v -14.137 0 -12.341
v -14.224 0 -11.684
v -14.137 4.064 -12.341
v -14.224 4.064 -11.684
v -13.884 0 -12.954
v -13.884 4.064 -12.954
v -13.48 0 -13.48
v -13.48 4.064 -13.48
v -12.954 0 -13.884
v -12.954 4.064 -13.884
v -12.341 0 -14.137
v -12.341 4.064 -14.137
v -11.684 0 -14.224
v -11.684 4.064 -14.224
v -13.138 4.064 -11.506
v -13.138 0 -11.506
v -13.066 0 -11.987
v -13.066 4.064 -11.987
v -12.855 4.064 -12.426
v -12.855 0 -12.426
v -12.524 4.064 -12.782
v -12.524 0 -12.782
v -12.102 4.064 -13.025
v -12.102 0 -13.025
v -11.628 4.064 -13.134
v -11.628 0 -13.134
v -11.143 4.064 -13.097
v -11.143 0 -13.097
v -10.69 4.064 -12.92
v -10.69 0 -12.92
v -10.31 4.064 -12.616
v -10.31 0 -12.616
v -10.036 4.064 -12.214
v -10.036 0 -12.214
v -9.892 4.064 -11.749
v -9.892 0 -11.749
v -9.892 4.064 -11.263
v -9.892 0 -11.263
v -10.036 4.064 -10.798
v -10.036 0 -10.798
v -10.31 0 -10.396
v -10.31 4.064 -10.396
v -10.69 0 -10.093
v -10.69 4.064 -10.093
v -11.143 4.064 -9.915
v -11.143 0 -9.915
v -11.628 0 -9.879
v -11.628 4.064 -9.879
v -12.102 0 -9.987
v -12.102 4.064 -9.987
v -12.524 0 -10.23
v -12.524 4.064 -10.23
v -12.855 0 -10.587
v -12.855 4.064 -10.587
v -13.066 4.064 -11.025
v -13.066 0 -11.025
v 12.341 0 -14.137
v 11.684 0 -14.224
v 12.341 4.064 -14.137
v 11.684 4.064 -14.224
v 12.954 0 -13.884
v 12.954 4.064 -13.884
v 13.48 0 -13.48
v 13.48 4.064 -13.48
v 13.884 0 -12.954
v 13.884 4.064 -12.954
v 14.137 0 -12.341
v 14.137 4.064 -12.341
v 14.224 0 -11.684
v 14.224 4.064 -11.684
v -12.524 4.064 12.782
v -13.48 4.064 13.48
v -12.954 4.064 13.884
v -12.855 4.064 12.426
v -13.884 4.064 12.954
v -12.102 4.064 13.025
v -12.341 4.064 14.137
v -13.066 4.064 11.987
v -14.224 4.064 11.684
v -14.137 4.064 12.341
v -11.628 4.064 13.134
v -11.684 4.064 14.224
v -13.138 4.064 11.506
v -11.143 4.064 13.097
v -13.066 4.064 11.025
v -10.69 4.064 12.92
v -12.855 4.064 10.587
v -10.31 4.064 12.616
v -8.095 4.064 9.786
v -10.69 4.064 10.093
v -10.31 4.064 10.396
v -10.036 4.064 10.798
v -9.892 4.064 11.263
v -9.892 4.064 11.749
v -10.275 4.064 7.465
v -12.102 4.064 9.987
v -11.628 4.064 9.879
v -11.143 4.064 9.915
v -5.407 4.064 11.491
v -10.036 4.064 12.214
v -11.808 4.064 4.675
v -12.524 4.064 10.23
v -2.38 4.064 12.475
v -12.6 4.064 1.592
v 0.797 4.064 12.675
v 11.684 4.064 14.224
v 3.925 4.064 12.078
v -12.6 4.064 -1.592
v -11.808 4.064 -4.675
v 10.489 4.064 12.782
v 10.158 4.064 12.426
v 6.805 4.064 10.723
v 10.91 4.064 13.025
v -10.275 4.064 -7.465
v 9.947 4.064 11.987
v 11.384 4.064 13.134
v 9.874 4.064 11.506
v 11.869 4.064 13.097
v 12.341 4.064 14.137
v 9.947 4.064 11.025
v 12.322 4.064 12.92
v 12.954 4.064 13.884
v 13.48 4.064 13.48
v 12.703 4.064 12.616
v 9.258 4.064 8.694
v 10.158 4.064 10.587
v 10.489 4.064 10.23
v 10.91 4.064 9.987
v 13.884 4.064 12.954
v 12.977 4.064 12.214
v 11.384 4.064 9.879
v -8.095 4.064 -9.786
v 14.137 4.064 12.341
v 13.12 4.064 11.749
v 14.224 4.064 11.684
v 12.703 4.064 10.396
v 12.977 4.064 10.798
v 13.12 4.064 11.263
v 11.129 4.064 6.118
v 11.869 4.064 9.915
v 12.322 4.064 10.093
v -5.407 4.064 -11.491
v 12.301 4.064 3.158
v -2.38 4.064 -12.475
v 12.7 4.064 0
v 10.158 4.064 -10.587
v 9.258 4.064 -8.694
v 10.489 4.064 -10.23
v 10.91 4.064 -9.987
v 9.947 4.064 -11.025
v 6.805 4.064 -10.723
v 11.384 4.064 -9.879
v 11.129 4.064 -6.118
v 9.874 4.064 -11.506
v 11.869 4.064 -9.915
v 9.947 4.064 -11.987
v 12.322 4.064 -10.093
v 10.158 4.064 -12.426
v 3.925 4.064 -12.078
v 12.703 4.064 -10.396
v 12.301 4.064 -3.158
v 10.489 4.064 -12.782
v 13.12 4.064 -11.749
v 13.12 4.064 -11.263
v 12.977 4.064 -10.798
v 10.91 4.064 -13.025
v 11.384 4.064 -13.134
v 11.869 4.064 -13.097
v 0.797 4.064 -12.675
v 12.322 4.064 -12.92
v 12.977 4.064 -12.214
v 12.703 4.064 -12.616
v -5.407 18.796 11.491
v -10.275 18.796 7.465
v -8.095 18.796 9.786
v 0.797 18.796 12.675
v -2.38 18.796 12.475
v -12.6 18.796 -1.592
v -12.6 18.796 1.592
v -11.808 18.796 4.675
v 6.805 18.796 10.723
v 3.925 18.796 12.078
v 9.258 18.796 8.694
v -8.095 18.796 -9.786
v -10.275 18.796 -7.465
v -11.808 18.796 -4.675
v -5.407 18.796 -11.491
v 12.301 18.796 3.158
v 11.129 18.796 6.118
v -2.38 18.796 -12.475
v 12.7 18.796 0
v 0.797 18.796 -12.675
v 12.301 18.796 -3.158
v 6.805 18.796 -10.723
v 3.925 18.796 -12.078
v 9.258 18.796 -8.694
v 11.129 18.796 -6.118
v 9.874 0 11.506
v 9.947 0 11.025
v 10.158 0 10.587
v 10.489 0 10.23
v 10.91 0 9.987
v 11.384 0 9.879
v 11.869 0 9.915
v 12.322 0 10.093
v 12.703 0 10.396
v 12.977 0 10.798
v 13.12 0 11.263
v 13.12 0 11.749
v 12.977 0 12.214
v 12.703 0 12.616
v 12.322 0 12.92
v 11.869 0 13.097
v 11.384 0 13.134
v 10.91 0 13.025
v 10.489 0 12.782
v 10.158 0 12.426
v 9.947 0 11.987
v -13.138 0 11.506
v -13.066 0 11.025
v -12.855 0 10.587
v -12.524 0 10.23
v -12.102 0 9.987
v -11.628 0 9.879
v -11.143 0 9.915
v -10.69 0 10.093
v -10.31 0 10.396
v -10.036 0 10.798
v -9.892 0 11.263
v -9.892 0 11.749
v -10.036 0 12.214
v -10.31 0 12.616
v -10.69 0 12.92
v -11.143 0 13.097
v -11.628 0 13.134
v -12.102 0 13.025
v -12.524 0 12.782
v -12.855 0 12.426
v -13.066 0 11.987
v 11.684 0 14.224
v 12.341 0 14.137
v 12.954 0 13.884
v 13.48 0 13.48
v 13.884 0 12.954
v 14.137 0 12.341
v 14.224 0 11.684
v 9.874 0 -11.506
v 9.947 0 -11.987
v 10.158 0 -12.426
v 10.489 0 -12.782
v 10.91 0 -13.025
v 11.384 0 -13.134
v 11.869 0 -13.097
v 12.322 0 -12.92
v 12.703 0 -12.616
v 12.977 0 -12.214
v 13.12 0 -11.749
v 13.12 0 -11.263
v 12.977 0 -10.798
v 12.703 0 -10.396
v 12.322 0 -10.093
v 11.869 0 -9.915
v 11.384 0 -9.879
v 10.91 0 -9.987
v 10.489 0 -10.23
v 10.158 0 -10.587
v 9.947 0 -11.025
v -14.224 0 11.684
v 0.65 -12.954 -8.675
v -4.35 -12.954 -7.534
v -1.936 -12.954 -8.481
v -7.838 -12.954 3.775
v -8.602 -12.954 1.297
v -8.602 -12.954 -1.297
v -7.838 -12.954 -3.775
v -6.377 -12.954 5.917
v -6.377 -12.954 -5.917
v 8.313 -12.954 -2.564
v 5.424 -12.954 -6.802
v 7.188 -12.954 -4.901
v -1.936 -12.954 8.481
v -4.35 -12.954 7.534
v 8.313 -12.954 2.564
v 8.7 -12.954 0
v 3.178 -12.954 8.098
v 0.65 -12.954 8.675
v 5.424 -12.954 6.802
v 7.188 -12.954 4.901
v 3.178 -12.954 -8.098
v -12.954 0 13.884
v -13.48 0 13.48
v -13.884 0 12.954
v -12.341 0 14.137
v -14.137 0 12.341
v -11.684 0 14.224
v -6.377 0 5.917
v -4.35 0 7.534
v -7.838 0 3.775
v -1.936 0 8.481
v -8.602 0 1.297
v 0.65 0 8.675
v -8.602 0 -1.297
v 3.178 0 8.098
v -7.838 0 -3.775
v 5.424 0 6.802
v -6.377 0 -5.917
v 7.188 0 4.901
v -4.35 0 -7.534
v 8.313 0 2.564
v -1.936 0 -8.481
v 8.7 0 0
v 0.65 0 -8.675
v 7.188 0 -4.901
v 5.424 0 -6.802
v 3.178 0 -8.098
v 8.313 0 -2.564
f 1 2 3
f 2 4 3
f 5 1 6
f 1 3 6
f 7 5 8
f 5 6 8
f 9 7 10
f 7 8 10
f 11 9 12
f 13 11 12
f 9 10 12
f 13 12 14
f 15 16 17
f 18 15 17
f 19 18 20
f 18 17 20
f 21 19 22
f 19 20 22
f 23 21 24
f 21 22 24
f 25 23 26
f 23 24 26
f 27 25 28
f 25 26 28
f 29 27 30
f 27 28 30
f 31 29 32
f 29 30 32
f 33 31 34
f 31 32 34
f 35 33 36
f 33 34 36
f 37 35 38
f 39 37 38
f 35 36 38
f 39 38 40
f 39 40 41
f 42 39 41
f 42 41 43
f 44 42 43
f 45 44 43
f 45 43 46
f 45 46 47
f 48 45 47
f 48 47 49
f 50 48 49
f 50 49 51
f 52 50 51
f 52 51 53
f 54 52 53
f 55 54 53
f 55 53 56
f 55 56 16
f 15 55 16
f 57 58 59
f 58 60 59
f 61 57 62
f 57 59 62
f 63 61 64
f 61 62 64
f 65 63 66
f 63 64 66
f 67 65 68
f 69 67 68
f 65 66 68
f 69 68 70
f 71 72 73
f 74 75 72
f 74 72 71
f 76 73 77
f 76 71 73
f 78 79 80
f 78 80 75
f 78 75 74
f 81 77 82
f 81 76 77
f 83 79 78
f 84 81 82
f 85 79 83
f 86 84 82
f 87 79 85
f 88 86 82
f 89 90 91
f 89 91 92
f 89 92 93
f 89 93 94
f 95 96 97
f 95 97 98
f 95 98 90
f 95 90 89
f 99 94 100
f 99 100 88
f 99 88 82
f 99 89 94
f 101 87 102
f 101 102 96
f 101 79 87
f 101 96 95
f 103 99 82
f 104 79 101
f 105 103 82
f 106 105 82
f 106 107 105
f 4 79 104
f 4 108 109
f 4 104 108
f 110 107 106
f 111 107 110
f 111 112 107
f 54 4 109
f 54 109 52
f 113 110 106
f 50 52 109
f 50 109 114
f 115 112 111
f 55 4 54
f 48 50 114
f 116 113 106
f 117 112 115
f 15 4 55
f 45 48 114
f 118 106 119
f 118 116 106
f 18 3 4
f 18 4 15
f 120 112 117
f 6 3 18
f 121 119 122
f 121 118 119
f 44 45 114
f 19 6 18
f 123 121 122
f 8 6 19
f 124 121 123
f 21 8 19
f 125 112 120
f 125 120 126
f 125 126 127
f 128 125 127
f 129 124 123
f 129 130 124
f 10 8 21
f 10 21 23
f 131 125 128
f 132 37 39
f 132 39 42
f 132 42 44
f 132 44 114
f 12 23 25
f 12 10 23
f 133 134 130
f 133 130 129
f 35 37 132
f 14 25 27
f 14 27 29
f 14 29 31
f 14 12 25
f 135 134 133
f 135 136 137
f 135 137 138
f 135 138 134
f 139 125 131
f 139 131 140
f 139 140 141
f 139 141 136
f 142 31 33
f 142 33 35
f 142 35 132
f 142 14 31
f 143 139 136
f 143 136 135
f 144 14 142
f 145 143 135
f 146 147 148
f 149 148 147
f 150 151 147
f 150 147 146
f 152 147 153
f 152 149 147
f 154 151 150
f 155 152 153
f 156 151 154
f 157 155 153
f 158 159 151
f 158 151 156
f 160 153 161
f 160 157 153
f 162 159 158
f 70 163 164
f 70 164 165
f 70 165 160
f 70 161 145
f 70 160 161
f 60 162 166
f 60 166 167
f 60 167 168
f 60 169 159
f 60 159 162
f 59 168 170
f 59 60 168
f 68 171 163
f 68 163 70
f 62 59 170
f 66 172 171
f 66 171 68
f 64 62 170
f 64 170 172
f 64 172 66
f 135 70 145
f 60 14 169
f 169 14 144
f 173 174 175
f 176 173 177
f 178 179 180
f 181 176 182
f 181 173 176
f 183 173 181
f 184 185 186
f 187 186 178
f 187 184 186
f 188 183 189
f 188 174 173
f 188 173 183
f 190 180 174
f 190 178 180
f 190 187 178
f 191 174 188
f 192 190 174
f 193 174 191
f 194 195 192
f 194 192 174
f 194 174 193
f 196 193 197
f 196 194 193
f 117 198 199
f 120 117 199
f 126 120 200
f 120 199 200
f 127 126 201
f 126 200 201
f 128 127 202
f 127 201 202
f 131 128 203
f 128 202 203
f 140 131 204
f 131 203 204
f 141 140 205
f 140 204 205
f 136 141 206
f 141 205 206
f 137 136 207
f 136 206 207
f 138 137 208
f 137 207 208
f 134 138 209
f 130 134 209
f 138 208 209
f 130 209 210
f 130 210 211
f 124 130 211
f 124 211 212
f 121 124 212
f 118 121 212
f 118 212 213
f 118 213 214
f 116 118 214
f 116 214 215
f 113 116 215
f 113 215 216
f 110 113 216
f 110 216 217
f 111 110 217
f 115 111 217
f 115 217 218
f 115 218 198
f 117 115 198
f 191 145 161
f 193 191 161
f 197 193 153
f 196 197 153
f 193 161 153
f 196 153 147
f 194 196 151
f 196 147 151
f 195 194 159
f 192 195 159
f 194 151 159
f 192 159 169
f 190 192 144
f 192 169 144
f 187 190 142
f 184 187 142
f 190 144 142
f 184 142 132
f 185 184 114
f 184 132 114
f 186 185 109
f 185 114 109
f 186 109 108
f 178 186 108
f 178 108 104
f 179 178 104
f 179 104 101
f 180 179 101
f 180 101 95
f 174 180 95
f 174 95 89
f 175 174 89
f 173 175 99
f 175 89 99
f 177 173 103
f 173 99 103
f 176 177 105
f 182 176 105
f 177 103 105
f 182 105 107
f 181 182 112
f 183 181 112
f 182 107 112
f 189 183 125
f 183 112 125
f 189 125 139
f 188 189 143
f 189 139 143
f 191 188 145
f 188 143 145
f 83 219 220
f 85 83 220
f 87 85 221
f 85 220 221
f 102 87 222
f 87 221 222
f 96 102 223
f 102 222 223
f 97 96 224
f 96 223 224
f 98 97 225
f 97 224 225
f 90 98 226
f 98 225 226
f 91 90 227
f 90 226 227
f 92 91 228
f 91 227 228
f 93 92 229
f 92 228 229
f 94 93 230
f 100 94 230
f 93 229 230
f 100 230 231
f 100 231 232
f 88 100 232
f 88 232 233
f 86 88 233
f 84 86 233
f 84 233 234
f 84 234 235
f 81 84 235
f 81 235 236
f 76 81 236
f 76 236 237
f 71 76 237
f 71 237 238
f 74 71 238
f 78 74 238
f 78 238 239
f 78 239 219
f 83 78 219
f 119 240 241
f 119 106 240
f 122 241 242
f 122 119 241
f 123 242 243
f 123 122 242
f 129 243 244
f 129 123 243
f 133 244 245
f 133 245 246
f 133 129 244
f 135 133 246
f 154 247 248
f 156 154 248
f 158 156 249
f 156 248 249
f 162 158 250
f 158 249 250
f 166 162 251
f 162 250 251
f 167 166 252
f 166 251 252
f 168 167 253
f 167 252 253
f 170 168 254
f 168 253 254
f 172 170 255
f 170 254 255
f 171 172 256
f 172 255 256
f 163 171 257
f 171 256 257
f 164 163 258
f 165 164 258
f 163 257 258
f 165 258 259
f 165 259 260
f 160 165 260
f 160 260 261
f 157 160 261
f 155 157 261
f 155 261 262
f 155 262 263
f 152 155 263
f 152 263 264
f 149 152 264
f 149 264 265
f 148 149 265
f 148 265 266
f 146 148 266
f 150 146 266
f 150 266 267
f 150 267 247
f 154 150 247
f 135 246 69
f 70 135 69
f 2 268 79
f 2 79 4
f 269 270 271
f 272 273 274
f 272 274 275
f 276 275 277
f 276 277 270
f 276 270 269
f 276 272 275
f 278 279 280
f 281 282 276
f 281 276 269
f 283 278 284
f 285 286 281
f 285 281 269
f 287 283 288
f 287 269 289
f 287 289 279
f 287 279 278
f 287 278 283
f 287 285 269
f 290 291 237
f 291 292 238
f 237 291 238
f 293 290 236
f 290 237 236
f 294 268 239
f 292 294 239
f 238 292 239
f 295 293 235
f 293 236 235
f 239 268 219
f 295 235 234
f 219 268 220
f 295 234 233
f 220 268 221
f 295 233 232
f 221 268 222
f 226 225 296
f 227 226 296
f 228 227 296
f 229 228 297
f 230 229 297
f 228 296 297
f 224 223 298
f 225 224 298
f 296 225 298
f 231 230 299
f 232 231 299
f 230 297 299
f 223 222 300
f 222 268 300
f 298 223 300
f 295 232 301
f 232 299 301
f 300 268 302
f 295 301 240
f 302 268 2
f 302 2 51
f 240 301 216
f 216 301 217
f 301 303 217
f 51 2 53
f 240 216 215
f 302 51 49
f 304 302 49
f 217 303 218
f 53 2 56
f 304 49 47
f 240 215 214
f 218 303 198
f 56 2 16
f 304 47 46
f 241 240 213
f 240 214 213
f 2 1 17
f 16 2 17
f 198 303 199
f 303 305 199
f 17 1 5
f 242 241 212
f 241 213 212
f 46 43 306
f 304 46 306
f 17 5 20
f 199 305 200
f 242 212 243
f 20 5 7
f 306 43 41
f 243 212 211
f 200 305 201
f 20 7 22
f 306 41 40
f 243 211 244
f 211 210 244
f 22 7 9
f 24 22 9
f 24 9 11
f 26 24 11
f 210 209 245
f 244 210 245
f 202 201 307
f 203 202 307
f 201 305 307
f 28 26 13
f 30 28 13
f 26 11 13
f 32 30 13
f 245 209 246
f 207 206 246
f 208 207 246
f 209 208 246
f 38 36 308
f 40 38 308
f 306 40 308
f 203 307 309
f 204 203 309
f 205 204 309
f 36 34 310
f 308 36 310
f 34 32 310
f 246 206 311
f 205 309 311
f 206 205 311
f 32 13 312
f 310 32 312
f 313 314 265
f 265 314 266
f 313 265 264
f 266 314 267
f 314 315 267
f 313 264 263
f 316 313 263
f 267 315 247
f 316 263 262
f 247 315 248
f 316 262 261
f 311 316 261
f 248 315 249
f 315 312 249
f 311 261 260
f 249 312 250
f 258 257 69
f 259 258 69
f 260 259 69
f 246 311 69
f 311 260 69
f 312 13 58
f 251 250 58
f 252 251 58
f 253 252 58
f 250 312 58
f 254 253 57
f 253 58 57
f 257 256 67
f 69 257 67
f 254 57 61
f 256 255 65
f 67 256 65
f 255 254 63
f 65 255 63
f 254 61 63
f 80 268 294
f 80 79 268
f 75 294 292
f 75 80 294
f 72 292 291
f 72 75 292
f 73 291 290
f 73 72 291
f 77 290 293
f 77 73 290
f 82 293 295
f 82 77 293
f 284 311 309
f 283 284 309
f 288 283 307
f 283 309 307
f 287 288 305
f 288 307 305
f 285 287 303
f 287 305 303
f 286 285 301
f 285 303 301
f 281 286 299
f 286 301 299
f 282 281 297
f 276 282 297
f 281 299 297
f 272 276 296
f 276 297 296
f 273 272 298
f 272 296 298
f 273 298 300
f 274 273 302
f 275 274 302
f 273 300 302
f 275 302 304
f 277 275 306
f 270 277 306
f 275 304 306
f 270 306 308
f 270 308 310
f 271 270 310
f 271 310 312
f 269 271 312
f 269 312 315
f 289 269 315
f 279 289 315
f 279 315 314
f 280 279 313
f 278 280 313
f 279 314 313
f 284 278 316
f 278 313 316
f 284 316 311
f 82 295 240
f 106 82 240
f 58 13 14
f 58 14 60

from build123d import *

# Parameters (mm, degrees)
SKETCH1_W                 = 28.448
SKETCH1_H                 = 28.448
BOSS_EXTRUDE1_DEPTH       = 4.064
SKETCH2_R                 = 12.7
BOSS_EXTRUDE2_DEPTH       = 14.732
SKETCH3_R                 = 8.6995
BOSS_EXTRUDE3_DEPTH       = 12.954
F_4_CLEARANCE_HOLE1_D     = 3.2639
F_4_CLEARANCE_HOLE1_DEPTH = 7.62
F_4_CLEARANCE_HOLE1_TIP   = 0.980574487
FILLET1_R                 = 2.54


with BuildPart() as part:
    # Sketch1 → Boss-Extrude1 (new body)
    with BuildSketch(Plane(origin=(0, 0, 0), x_dir=(1, 0, 0), z_dir=(0, 1, 0))):
        Rectangle(SKETCH1_W, SKETCH1_H)
    extrude(amount=BOSS_EXTRUDE1_DEPTH)

    # Sketch2 → Boss-Extrude2 (add)
    with BuildSketch(Plane(origin=(0, 4.064, 0), x_dir=(1, 0, 0), z_dir=(0, 1, 0))):
        Circle(SKETCH2_R)
    extrude(amount=BOSS_EXTRUDE2_DEPTH)

    # Sketch3 → Boss-Extrude3 (add)
    with BuildSketch(Plane.XZ):
        Circle(SKETCH3_R)
    extrude(amount=BOSS_EXTRUDE3_DEPTH)

    # #4 Clearance Hole1
    with Locations(Plane(origin=(0, 4.064, 0), x_dir=(1, 0, 0), z_dir=(0, 1, 0))):
        with Locations((-11.5062, -11.5062), (11.5062, 11.5062), (-11.5062, 11.5062), (11.5062, -11.5062)):
            Hole(F_4_CLEARANCE_HOLE1_D / 2, depth=F_4_CLEARANCE_HOLE1_DEPTH)
            with Locations((0, 0, -(F_4_CLEARANCE_HOLE1_DEPTH + F_4_CLEARANCE_HOLE1_TIP / 2))):  # 118° drill point
                Cone(0, F_4_CLEARANCE_HOLE1_D / 2, F_4_CLEARANCE_HOLE1_TIP, mode=Mode.SUBTRACT)

    # Fillet1
    fillet1_edges = [part.edges().sort_by_distance(p)[0] for p in [
        (14.224, 2.032, 14.224),
        (-14.224, 2.032, 14.224),
        (-14.224, 2.032, -14.224),
        (14.224, 2.032, -14.224),
    ]]
    fillet(fillet1_edges, radius=FILLET1_R)


solid = part.part
